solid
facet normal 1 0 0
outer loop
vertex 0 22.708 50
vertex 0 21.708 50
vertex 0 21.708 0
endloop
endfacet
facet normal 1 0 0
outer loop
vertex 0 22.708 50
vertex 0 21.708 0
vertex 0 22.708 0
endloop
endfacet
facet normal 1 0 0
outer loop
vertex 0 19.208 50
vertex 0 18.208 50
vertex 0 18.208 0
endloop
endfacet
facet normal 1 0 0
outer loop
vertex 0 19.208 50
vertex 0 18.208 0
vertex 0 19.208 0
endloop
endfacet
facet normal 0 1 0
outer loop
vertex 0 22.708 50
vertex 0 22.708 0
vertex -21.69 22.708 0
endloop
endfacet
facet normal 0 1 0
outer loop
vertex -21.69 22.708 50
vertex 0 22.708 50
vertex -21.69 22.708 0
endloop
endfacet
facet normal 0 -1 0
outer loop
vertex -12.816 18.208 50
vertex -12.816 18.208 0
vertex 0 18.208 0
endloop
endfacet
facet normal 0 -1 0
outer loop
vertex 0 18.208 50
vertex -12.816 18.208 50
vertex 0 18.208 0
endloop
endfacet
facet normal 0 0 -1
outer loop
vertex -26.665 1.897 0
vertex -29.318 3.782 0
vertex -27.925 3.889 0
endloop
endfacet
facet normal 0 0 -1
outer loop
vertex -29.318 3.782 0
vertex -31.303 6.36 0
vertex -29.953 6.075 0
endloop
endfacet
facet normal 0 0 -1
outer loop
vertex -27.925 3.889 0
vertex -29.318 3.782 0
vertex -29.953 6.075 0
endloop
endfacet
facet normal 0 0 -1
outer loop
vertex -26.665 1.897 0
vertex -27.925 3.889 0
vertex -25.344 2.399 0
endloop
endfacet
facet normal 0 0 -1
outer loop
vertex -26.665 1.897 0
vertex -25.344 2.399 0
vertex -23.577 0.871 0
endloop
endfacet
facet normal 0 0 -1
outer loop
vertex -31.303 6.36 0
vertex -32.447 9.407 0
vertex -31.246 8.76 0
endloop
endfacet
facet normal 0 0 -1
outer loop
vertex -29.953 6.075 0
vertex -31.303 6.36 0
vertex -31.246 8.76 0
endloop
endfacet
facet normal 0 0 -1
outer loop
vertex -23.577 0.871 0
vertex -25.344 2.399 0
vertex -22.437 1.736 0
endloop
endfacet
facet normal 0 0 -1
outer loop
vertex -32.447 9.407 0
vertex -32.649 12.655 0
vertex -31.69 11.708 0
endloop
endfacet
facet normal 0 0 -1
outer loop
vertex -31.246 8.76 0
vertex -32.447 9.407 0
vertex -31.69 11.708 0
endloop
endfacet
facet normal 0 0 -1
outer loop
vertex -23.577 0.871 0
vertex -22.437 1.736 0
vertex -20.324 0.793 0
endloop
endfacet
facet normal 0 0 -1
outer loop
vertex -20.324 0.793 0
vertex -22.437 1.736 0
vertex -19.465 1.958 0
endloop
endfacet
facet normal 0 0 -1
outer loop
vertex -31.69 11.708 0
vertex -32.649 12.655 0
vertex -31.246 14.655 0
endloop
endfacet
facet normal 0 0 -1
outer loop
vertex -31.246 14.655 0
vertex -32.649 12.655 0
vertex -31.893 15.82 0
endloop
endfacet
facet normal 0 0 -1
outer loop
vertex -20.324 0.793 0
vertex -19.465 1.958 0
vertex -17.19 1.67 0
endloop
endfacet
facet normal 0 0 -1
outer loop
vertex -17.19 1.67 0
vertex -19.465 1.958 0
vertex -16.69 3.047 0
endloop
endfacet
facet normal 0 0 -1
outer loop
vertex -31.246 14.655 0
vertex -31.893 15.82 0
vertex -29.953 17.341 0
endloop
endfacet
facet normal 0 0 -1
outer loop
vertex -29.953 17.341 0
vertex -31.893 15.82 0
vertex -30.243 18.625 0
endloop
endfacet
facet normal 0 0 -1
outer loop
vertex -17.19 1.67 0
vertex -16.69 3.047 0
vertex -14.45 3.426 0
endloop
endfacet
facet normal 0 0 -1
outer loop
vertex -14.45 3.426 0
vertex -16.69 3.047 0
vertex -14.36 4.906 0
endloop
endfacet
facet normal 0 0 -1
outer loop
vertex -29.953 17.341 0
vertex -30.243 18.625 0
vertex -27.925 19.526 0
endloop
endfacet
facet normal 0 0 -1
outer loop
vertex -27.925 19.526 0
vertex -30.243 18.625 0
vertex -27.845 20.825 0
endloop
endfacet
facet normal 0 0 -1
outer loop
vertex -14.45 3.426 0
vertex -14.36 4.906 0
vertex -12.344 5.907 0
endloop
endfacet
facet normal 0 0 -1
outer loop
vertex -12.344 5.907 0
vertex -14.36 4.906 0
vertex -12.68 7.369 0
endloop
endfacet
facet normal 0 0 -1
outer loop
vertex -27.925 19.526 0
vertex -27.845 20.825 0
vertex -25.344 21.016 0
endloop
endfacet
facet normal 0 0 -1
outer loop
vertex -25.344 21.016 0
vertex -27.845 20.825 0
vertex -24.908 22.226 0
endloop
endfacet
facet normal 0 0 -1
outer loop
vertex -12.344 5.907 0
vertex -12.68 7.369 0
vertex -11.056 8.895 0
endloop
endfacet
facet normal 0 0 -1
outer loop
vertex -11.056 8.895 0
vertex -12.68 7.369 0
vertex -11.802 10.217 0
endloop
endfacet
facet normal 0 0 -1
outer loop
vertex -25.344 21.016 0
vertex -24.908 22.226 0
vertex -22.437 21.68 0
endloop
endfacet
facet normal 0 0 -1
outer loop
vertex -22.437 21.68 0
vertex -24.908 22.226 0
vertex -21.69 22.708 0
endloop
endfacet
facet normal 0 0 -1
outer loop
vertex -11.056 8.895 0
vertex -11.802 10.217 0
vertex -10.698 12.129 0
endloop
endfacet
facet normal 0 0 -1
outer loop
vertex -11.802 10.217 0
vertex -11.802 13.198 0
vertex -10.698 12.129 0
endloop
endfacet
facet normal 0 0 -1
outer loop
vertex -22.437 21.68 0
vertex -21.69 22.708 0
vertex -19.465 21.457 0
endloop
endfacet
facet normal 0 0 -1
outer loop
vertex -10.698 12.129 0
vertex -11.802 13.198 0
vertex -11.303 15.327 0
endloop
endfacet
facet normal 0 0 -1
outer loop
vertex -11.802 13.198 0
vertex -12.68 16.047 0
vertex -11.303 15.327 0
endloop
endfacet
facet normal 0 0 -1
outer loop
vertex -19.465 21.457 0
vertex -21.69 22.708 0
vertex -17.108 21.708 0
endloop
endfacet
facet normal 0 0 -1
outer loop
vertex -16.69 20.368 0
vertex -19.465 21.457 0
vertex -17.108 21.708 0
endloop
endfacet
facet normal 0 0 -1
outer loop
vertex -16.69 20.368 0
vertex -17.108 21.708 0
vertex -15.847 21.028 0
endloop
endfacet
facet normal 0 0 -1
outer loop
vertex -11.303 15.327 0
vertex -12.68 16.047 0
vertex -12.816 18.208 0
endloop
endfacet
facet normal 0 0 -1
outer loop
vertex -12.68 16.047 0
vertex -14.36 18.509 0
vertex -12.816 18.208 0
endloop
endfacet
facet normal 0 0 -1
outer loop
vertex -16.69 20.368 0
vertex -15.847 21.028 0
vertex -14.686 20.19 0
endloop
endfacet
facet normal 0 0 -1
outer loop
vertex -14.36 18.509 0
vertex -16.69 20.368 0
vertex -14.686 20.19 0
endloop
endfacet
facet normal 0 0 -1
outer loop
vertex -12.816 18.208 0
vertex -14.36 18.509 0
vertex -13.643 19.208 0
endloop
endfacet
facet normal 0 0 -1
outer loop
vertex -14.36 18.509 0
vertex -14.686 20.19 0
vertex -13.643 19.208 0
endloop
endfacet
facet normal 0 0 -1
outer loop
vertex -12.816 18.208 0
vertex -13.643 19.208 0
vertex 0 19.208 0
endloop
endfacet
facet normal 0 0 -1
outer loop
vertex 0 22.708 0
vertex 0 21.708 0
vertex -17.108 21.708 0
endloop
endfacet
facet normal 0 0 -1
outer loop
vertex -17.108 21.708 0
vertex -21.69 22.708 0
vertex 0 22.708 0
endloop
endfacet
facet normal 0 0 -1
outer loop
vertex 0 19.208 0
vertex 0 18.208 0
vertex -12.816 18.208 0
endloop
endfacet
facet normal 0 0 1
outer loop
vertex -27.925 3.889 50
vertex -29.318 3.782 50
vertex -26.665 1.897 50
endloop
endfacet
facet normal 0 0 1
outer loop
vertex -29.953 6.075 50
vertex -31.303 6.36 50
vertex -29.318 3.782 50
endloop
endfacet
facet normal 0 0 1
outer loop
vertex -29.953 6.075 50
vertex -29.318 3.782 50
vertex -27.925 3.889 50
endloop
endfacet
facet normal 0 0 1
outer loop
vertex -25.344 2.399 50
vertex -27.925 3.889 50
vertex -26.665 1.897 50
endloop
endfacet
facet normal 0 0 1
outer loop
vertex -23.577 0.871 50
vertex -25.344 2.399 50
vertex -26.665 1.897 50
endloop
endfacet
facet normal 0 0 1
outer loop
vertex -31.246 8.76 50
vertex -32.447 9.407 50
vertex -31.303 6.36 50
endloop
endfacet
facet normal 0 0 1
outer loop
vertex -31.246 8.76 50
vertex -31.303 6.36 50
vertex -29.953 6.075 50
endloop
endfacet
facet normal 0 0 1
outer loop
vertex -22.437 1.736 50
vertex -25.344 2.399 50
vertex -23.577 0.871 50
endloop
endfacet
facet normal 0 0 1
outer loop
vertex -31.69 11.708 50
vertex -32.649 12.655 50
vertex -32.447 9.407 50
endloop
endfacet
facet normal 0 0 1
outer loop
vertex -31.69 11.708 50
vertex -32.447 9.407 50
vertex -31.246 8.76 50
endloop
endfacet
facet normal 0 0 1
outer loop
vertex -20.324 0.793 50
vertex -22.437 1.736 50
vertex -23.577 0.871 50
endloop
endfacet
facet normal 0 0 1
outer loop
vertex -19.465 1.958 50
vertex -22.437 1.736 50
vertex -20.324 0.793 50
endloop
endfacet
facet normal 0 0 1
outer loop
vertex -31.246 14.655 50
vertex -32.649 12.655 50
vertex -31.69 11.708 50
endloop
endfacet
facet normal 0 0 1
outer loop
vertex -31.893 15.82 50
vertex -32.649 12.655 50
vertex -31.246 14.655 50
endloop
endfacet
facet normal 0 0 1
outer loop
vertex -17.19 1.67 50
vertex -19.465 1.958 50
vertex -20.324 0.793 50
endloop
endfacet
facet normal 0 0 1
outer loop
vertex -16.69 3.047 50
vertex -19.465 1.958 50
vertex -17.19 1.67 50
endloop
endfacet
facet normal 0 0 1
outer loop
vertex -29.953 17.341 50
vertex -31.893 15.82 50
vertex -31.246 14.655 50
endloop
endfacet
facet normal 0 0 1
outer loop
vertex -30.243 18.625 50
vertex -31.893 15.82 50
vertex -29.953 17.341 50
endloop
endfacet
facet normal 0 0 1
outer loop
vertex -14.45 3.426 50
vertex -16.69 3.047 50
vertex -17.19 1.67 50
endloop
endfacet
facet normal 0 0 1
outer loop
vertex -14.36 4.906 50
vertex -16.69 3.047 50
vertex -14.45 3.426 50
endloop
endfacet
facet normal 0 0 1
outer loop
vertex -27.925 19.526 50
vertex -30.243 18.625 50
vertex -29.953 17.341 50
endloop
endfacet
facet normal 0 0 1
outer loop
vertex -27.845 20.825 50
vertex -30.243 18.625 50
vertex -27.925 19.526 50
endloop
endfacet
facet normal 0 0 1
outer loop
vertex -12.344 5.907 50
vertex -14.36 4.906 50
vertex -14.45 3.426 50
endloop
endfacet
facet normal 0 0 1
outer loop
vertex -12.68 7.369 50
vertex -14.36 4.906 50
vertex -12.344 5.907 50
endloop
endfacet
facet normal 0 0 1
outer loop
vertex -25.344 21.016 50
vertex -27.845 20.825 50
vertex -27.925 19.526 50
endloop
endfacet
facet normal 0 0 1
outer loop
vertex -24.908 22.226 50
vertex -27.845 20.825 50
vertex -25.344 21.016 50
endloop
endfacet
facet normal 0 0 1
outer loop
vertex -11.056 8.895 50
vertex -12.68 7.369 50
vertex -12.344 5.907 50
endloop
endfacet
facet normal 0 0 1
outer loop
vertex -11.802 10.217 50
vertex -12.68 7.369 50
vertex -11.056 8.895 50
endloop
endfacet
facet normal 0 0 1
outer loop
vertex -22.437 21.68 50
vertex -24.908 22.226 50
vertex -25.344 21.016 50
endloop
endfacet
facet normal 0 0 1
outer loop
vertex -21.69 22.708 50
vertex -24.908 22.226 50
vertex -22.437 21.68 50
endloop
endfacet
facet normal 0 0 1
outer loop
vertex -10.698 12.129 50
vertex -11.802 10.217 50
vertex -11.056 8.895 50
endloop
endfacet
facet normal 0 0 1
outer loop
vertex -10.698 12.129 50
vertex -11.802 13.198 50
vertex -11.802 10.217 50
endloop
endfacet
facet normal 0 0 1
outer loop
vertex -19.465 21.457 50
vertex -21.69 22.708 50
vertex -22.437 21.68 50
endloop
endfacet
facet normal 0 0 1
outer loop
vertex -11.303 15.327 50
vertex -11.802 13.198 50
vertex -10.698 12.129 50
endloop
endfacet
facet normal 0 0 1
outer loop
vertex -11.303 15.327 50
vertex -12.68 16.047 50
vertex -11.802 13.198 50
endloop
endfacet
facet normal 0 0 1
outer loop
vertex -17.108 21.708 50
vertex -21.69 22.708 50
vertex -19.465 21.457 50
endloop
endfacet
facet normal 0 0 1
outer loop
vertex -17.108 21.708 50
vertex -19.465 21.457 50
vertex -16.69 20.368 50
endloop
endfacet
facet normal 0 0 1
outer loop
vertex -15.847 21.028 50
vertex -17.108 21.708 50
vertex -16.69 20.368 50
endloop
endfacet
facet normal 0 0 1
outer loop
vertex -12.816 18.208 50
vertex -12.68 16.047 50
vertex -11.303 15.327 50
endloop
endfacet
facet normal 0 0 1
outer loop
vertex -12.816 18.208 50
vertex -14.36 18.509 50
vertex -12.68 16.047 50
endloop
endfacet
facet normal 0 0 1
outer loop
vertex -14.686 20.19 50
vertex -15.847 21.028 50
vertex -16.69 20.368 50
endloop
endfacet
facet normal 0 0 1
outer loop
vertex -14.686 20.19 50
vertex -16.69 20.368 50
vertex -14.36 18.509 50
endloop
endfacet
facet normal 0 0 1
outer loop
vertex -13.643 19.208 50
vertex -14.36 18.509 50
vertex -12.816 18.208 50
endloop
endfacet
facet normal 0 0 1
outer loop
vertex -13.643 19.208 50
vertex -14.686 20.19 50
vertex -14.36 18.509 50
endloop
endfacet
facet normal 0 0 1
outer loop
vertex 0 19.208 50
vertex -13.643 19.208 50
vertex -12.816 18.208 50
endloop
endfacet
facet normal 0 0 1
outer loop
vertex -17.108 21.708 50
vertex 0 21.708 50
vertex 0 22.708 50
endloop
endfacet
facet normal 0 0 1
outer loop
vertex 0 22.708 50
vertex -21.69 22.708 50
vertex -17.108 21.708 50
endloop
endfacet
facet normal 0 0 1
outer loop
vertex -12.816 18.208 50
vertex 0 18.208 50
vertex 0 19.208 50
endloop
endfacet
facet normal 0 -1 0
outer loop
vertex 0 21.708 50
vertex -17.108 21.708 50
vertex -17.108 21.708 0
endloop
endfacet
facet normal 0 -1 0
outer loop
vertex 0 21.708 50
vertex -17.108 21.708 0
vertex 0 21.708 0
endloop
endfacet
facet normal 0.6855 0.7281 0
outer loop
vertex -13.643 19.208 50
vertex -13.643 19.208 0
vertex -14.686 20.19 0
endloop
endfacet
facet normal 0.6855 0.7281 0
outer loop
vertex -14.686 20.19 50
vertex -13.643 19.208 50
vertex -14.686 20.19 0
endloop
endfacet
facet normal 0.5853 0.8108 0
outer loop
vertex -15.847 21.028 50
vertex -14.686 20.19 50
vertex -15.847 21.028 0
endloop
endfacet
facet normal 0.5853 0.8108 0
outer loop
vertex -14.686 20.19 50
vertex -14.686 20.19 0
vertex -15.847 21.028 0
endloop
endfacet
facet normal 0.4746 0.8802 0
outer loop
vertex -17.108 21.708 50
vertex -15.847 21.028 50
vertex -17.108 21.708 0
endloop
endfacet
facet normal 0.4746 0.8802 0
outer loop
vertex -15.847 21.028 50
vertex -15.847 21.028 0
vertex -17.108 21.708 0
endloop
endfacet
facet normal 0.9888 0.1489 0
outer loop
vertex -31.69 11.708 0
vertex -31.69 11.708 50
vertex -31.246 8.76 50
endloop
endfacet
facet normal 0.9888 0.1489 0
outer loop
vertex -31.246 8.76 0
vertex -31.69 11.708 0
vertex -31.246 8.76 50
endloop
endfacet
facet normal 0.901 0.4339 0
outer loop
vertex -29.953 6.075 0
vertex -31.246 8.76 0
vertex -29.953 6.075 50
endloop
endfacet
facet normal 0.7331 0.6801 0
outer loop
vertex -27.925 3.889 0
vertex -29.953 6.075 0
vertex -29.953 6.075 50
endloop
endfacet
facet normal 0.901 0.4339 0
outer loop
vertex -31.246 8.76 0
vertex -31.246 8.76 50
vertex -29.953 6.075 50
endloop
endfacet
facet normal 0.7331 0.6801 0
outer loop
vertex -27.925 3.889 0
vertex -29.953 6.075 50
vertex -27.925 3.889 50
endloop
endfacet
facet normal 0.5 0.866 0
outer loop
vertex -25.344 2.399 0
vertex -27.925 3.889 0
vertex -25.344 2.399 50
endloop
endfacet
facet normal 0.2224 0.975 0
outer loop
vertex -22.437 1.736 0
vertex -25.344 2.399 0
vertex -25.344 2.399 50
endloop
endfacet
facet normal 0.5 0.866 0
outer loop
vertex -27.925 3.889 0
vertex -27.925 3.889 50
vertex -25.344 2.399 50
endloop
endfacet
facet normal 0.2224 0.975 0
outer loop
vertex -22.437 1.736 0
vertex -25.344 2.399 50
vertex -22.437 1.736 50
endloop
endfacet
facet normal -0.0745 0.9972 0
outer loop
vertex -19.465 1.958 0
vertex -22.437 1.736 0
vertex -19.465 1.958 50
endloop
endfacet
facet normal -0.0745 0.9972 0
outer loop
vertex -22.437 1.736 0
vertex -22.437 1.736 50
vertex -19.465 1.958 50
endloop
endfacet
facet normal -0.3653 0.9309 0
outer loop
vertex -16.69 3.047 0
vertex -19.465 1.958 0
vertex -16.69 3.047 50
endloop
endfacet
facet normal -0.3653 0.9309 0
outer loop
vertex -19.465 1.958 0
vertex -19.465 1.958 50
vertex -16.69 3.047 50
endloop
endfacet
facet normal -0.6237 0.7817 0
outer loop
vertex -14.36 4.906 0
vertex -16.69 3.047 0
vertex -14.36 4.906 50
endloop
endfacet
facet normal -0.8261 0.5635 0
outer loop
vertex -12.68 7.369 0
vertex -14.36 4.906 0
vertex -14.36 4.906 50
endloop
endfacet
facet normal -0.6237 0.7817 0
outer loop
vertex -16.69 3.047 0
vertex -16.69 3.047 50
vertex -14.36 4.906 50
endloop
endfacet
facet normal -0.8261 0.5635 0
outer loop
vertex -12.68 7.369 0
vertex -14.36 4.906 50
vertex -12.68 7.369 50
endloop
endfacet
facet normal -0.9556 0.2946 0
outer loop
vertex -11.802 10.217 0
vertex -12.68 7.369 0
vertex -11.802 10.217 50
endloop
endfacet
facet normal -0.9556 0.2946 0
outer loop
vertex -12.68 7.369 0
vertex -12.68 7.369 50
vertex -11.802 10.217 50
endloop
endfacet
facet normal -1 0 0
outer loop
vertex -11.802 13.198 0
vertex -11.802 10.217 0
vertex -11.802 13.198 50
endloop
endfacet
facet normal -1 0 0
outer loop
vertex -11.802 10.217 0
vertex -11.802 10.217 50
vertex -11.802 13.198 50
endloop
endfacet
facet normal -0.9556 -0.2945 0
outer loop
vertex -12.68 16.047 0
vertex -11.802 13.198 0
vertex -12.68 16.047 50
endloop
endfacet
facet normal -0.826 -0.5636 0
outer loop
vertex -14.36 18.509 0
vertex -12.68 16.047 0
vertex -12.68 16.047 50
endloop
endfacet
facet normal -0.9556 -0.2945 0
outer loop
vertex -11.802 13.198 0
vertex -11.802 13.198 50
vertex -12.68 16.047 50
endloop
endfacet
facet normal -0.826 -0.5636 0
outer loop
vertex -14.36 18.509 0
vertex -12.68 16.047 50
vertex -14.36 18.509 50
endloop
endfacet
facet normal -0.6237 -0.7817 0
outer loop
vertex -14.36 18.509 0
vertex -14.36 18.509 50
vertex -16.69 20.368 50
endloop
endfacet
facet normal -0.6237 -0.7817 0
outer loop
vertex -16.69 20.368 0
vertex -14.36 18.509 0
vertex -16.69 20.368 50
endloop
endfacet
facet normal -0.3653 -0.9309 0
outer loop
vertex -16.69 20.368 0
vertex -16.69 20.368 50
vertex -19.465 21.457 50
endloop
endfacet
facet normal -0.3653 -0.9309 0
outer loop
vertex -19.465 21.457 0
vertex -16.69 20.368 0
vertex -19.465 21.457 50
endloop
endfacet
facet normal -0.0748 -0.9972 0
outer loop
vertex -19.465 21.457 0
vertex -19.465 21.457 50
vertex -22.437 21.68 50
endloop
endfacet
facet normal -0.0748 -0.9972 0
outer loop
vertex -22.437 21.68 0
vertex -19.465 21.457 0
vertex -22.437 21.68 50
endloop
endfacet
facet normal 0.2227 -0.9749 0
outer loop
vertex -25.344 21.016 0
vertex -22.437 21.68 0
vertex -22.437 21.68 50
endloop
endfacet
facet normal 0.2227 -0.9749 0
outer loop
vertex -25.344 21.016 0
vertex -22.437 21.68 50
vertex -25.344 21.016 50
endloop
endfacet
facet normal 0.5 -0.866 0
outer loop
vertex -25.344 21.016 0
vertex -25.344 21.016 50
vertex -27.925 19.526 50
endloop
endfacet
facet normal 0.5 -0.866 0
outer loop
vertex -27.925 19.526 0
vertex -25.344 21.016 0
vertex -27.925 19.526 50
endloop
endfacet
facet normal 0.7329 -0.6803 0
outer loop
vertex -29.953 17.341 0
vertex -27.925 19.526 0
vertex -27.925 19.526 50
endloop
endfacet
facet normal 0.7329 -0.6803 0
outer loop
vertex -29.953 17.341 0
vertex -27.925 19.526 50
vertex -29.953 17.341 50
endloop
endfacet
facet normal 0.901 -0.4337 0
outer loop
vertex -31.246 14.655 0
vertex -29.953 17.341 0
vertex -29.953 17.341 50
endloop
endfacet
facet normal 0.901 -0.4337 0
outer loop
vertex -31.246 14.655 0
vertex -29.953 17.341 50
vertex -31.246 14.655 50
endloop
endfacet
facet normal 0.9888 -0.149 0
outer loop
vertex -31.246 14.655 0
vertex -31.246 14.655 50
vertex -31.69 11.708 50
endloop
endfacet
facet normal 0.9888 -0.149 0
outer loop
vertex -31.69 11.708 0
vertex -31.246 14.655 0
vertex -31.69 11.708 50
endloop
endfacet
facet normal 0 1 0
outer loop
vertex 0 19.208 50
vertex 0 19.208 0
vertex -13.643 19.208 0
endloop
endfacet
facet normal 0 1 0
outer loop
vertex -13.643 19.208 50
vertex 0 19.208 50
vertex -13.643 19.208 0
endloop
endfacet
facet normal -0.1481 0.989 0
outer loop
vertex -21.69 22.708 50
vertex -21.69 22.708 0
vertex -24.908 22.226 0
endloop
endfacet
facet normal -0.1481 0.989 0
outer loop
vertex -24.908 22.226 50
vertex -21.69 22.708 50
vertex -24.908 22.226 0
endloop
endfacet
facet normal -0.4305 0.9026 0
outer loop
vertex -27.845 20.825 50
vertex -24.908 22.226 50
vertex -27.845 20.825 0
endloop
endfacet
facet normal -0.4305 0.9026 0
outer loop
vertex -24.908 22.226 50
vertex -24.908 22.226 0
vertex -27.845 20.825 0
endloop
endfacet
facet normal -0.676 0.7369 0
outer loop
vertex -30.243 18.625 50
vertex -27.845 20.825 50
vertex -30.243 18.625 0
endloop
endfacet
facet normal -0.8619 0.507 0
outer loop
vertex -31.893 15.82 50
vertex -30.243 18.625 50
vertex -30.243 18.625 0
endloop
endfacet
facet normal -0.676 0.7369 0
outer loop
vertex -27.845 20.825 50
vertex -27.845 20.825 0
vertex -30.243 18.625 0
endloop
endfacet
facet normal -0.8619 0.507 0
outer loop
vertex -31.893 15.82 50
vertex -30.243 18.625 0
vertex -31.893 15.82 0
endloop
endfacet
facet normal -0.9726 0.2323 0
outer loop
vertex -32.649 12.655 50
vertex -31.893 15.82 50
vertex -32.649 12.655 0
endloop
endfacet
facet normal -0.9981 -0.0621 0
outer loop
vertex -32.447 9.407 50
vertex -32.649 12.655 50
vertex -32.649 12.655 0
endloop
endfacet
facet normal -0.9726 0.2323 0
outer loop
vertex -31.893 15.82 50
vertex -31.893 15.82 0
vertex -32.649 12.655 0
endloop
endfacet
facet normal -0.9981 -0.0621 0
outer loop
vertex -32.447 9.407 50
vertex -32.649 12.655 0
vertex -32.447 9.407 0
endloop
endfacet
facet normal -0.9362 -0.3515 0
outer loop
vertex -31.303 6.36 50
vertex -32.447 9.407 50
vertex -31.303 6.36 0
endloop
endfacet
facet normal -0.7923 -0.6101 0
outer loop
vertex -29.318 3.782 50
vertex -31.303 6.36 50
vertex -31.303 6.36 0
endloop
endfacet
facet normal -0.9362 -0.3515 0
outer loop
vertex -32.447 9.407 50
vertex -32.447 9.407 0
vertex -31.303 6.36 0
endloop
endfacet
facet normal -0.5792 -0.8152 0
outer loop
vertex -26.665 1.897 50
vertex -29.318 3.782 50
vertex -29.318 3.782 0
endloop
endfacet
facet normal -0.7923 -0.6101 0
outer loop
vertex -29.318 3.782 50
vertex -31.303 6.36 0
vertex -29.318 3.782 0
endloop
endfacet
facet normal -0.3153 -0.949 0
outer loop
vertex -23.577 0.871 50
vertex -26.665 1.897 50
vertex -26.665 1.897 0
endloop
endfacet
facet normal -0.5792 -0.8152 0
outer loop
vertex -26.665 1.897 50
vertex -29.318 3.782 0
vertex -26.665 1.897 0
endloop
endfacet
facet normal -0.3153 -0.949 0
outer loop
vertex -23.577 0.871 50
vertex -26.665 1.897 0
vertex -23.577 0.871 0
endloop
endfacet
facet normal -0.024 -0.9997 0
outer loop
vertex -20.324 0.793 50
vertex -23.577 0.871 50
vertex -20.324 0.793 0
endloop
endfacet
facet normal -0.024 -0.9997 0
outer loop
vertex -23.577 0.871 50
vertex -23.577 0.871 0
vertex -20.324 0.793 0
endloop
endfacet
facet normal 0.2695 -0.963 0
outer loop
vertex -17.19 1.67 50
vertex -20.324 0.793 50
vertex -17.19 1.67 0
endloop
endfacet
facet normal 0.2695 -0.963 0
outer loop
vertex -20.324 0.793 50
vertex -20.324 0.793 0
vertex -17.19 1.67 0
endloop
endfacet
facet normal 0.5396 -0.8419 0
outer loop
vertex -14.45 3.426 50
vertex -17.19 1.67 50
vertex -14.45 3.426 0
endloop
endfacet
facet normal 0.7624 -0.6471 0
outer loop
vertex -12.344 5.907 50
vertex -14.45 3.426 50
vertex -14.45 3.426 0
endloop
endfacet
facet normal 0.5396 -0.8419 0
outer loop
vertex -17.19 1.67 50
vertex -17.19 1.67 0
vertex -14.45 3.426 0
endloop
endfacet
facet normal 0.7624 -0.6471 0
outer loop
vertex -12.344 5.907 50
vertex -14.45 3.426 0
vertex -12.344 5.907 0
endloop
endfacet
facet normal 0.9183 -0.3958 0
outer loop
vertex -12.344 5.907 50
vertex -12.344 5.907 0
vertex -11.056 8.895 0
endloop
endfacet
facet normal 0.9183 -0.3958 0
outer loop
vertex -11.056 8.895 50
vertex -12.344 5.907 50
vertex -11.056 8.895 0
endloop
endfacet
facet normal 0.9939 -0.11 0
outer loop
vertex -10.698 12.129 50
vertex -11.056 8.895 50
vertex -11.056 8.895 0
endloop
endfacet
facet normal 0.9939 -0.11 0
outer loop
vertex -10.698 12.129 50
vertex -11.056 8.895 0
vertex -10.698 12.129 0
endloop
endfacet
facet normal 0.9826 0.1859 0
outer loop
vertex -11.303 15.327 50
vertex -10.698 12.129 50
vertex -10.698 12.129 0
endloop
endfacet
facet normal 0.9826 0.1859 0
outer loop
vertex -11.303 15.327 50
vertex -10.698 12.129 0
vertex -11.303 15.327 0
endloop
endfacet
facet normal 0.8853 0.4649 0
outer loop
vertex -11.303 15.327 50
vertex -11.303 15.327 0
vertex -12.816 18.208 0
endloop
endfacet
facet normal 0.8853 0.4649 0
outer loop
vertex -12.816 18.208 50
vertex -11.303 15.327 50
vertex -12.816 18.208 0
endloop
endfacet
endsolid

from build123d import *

# Parameters (mm, degrees)
F0_R     = 10
F1_DEPTH = 50
F2_D     = 20
F2_DEPTH = 51
F2_TIP   = 6.0086061903


# Not quite as in the source:
# - a feature names something its author has since deleted; it is built from what else it names


with BuildPart() as f1:
    # F0 (on Top) → F1 (new body)
    with BuildSketch(Plane.XY):
        with BuildLine():
            Line((0, 19.2077464238), (-13.6434029399, 19.2077464238))
            ThreePointArc((-13.6434029399, 19.2077464238), (-15.252953043, 20.6275337493), (-17.1075657147, 21.7077464238))
            Line((-17.1075657147, 21.7077464238), (0, 21.7077464238))
            Line((0, 21.7077464238), (0, 22.7077464238))
            Line((0, 22.7077464238), (-21.6901414096, 22.7077464238))
            ThreePointArc((-21.6901414096, 22.7077464238), (-26.6650785952, 1.8970379886), (-12.816021735, 18.2077464238))
            Line((-12.816021735, 18.2077464238), (0, 18.2077464238))
            Line((0, 18.2077464238), (0, 19.2077464238))
        make_face()
        with Locations((-21.6901414096, 11.7077464238)):
            Circle(F0_R, mode=Mode.SUBTRACT)
        with Locations((-21.6901414096, 11.7077464238)):
            Circle(F0_R)
    extrude(amount=F1_DEPTH)

    # F2
    with Locations(Plane(origin=(0, 0, 0), x_dir=(1, 0, 0), z_dir=(0, 0, -1))):
        with Locations((-21.6901414096, -11.7077464238)):
            Hole(F2_D / 2, depth=F2_DEPTH)
            with Locations((0, 0, -(F2_DEPTH + F2_TIP / 2))):  # 118° drill point
                Cone(0, F2_D / 2, F2_TIP, mode=Mode.SUBTRACT)


solid = f1.part
